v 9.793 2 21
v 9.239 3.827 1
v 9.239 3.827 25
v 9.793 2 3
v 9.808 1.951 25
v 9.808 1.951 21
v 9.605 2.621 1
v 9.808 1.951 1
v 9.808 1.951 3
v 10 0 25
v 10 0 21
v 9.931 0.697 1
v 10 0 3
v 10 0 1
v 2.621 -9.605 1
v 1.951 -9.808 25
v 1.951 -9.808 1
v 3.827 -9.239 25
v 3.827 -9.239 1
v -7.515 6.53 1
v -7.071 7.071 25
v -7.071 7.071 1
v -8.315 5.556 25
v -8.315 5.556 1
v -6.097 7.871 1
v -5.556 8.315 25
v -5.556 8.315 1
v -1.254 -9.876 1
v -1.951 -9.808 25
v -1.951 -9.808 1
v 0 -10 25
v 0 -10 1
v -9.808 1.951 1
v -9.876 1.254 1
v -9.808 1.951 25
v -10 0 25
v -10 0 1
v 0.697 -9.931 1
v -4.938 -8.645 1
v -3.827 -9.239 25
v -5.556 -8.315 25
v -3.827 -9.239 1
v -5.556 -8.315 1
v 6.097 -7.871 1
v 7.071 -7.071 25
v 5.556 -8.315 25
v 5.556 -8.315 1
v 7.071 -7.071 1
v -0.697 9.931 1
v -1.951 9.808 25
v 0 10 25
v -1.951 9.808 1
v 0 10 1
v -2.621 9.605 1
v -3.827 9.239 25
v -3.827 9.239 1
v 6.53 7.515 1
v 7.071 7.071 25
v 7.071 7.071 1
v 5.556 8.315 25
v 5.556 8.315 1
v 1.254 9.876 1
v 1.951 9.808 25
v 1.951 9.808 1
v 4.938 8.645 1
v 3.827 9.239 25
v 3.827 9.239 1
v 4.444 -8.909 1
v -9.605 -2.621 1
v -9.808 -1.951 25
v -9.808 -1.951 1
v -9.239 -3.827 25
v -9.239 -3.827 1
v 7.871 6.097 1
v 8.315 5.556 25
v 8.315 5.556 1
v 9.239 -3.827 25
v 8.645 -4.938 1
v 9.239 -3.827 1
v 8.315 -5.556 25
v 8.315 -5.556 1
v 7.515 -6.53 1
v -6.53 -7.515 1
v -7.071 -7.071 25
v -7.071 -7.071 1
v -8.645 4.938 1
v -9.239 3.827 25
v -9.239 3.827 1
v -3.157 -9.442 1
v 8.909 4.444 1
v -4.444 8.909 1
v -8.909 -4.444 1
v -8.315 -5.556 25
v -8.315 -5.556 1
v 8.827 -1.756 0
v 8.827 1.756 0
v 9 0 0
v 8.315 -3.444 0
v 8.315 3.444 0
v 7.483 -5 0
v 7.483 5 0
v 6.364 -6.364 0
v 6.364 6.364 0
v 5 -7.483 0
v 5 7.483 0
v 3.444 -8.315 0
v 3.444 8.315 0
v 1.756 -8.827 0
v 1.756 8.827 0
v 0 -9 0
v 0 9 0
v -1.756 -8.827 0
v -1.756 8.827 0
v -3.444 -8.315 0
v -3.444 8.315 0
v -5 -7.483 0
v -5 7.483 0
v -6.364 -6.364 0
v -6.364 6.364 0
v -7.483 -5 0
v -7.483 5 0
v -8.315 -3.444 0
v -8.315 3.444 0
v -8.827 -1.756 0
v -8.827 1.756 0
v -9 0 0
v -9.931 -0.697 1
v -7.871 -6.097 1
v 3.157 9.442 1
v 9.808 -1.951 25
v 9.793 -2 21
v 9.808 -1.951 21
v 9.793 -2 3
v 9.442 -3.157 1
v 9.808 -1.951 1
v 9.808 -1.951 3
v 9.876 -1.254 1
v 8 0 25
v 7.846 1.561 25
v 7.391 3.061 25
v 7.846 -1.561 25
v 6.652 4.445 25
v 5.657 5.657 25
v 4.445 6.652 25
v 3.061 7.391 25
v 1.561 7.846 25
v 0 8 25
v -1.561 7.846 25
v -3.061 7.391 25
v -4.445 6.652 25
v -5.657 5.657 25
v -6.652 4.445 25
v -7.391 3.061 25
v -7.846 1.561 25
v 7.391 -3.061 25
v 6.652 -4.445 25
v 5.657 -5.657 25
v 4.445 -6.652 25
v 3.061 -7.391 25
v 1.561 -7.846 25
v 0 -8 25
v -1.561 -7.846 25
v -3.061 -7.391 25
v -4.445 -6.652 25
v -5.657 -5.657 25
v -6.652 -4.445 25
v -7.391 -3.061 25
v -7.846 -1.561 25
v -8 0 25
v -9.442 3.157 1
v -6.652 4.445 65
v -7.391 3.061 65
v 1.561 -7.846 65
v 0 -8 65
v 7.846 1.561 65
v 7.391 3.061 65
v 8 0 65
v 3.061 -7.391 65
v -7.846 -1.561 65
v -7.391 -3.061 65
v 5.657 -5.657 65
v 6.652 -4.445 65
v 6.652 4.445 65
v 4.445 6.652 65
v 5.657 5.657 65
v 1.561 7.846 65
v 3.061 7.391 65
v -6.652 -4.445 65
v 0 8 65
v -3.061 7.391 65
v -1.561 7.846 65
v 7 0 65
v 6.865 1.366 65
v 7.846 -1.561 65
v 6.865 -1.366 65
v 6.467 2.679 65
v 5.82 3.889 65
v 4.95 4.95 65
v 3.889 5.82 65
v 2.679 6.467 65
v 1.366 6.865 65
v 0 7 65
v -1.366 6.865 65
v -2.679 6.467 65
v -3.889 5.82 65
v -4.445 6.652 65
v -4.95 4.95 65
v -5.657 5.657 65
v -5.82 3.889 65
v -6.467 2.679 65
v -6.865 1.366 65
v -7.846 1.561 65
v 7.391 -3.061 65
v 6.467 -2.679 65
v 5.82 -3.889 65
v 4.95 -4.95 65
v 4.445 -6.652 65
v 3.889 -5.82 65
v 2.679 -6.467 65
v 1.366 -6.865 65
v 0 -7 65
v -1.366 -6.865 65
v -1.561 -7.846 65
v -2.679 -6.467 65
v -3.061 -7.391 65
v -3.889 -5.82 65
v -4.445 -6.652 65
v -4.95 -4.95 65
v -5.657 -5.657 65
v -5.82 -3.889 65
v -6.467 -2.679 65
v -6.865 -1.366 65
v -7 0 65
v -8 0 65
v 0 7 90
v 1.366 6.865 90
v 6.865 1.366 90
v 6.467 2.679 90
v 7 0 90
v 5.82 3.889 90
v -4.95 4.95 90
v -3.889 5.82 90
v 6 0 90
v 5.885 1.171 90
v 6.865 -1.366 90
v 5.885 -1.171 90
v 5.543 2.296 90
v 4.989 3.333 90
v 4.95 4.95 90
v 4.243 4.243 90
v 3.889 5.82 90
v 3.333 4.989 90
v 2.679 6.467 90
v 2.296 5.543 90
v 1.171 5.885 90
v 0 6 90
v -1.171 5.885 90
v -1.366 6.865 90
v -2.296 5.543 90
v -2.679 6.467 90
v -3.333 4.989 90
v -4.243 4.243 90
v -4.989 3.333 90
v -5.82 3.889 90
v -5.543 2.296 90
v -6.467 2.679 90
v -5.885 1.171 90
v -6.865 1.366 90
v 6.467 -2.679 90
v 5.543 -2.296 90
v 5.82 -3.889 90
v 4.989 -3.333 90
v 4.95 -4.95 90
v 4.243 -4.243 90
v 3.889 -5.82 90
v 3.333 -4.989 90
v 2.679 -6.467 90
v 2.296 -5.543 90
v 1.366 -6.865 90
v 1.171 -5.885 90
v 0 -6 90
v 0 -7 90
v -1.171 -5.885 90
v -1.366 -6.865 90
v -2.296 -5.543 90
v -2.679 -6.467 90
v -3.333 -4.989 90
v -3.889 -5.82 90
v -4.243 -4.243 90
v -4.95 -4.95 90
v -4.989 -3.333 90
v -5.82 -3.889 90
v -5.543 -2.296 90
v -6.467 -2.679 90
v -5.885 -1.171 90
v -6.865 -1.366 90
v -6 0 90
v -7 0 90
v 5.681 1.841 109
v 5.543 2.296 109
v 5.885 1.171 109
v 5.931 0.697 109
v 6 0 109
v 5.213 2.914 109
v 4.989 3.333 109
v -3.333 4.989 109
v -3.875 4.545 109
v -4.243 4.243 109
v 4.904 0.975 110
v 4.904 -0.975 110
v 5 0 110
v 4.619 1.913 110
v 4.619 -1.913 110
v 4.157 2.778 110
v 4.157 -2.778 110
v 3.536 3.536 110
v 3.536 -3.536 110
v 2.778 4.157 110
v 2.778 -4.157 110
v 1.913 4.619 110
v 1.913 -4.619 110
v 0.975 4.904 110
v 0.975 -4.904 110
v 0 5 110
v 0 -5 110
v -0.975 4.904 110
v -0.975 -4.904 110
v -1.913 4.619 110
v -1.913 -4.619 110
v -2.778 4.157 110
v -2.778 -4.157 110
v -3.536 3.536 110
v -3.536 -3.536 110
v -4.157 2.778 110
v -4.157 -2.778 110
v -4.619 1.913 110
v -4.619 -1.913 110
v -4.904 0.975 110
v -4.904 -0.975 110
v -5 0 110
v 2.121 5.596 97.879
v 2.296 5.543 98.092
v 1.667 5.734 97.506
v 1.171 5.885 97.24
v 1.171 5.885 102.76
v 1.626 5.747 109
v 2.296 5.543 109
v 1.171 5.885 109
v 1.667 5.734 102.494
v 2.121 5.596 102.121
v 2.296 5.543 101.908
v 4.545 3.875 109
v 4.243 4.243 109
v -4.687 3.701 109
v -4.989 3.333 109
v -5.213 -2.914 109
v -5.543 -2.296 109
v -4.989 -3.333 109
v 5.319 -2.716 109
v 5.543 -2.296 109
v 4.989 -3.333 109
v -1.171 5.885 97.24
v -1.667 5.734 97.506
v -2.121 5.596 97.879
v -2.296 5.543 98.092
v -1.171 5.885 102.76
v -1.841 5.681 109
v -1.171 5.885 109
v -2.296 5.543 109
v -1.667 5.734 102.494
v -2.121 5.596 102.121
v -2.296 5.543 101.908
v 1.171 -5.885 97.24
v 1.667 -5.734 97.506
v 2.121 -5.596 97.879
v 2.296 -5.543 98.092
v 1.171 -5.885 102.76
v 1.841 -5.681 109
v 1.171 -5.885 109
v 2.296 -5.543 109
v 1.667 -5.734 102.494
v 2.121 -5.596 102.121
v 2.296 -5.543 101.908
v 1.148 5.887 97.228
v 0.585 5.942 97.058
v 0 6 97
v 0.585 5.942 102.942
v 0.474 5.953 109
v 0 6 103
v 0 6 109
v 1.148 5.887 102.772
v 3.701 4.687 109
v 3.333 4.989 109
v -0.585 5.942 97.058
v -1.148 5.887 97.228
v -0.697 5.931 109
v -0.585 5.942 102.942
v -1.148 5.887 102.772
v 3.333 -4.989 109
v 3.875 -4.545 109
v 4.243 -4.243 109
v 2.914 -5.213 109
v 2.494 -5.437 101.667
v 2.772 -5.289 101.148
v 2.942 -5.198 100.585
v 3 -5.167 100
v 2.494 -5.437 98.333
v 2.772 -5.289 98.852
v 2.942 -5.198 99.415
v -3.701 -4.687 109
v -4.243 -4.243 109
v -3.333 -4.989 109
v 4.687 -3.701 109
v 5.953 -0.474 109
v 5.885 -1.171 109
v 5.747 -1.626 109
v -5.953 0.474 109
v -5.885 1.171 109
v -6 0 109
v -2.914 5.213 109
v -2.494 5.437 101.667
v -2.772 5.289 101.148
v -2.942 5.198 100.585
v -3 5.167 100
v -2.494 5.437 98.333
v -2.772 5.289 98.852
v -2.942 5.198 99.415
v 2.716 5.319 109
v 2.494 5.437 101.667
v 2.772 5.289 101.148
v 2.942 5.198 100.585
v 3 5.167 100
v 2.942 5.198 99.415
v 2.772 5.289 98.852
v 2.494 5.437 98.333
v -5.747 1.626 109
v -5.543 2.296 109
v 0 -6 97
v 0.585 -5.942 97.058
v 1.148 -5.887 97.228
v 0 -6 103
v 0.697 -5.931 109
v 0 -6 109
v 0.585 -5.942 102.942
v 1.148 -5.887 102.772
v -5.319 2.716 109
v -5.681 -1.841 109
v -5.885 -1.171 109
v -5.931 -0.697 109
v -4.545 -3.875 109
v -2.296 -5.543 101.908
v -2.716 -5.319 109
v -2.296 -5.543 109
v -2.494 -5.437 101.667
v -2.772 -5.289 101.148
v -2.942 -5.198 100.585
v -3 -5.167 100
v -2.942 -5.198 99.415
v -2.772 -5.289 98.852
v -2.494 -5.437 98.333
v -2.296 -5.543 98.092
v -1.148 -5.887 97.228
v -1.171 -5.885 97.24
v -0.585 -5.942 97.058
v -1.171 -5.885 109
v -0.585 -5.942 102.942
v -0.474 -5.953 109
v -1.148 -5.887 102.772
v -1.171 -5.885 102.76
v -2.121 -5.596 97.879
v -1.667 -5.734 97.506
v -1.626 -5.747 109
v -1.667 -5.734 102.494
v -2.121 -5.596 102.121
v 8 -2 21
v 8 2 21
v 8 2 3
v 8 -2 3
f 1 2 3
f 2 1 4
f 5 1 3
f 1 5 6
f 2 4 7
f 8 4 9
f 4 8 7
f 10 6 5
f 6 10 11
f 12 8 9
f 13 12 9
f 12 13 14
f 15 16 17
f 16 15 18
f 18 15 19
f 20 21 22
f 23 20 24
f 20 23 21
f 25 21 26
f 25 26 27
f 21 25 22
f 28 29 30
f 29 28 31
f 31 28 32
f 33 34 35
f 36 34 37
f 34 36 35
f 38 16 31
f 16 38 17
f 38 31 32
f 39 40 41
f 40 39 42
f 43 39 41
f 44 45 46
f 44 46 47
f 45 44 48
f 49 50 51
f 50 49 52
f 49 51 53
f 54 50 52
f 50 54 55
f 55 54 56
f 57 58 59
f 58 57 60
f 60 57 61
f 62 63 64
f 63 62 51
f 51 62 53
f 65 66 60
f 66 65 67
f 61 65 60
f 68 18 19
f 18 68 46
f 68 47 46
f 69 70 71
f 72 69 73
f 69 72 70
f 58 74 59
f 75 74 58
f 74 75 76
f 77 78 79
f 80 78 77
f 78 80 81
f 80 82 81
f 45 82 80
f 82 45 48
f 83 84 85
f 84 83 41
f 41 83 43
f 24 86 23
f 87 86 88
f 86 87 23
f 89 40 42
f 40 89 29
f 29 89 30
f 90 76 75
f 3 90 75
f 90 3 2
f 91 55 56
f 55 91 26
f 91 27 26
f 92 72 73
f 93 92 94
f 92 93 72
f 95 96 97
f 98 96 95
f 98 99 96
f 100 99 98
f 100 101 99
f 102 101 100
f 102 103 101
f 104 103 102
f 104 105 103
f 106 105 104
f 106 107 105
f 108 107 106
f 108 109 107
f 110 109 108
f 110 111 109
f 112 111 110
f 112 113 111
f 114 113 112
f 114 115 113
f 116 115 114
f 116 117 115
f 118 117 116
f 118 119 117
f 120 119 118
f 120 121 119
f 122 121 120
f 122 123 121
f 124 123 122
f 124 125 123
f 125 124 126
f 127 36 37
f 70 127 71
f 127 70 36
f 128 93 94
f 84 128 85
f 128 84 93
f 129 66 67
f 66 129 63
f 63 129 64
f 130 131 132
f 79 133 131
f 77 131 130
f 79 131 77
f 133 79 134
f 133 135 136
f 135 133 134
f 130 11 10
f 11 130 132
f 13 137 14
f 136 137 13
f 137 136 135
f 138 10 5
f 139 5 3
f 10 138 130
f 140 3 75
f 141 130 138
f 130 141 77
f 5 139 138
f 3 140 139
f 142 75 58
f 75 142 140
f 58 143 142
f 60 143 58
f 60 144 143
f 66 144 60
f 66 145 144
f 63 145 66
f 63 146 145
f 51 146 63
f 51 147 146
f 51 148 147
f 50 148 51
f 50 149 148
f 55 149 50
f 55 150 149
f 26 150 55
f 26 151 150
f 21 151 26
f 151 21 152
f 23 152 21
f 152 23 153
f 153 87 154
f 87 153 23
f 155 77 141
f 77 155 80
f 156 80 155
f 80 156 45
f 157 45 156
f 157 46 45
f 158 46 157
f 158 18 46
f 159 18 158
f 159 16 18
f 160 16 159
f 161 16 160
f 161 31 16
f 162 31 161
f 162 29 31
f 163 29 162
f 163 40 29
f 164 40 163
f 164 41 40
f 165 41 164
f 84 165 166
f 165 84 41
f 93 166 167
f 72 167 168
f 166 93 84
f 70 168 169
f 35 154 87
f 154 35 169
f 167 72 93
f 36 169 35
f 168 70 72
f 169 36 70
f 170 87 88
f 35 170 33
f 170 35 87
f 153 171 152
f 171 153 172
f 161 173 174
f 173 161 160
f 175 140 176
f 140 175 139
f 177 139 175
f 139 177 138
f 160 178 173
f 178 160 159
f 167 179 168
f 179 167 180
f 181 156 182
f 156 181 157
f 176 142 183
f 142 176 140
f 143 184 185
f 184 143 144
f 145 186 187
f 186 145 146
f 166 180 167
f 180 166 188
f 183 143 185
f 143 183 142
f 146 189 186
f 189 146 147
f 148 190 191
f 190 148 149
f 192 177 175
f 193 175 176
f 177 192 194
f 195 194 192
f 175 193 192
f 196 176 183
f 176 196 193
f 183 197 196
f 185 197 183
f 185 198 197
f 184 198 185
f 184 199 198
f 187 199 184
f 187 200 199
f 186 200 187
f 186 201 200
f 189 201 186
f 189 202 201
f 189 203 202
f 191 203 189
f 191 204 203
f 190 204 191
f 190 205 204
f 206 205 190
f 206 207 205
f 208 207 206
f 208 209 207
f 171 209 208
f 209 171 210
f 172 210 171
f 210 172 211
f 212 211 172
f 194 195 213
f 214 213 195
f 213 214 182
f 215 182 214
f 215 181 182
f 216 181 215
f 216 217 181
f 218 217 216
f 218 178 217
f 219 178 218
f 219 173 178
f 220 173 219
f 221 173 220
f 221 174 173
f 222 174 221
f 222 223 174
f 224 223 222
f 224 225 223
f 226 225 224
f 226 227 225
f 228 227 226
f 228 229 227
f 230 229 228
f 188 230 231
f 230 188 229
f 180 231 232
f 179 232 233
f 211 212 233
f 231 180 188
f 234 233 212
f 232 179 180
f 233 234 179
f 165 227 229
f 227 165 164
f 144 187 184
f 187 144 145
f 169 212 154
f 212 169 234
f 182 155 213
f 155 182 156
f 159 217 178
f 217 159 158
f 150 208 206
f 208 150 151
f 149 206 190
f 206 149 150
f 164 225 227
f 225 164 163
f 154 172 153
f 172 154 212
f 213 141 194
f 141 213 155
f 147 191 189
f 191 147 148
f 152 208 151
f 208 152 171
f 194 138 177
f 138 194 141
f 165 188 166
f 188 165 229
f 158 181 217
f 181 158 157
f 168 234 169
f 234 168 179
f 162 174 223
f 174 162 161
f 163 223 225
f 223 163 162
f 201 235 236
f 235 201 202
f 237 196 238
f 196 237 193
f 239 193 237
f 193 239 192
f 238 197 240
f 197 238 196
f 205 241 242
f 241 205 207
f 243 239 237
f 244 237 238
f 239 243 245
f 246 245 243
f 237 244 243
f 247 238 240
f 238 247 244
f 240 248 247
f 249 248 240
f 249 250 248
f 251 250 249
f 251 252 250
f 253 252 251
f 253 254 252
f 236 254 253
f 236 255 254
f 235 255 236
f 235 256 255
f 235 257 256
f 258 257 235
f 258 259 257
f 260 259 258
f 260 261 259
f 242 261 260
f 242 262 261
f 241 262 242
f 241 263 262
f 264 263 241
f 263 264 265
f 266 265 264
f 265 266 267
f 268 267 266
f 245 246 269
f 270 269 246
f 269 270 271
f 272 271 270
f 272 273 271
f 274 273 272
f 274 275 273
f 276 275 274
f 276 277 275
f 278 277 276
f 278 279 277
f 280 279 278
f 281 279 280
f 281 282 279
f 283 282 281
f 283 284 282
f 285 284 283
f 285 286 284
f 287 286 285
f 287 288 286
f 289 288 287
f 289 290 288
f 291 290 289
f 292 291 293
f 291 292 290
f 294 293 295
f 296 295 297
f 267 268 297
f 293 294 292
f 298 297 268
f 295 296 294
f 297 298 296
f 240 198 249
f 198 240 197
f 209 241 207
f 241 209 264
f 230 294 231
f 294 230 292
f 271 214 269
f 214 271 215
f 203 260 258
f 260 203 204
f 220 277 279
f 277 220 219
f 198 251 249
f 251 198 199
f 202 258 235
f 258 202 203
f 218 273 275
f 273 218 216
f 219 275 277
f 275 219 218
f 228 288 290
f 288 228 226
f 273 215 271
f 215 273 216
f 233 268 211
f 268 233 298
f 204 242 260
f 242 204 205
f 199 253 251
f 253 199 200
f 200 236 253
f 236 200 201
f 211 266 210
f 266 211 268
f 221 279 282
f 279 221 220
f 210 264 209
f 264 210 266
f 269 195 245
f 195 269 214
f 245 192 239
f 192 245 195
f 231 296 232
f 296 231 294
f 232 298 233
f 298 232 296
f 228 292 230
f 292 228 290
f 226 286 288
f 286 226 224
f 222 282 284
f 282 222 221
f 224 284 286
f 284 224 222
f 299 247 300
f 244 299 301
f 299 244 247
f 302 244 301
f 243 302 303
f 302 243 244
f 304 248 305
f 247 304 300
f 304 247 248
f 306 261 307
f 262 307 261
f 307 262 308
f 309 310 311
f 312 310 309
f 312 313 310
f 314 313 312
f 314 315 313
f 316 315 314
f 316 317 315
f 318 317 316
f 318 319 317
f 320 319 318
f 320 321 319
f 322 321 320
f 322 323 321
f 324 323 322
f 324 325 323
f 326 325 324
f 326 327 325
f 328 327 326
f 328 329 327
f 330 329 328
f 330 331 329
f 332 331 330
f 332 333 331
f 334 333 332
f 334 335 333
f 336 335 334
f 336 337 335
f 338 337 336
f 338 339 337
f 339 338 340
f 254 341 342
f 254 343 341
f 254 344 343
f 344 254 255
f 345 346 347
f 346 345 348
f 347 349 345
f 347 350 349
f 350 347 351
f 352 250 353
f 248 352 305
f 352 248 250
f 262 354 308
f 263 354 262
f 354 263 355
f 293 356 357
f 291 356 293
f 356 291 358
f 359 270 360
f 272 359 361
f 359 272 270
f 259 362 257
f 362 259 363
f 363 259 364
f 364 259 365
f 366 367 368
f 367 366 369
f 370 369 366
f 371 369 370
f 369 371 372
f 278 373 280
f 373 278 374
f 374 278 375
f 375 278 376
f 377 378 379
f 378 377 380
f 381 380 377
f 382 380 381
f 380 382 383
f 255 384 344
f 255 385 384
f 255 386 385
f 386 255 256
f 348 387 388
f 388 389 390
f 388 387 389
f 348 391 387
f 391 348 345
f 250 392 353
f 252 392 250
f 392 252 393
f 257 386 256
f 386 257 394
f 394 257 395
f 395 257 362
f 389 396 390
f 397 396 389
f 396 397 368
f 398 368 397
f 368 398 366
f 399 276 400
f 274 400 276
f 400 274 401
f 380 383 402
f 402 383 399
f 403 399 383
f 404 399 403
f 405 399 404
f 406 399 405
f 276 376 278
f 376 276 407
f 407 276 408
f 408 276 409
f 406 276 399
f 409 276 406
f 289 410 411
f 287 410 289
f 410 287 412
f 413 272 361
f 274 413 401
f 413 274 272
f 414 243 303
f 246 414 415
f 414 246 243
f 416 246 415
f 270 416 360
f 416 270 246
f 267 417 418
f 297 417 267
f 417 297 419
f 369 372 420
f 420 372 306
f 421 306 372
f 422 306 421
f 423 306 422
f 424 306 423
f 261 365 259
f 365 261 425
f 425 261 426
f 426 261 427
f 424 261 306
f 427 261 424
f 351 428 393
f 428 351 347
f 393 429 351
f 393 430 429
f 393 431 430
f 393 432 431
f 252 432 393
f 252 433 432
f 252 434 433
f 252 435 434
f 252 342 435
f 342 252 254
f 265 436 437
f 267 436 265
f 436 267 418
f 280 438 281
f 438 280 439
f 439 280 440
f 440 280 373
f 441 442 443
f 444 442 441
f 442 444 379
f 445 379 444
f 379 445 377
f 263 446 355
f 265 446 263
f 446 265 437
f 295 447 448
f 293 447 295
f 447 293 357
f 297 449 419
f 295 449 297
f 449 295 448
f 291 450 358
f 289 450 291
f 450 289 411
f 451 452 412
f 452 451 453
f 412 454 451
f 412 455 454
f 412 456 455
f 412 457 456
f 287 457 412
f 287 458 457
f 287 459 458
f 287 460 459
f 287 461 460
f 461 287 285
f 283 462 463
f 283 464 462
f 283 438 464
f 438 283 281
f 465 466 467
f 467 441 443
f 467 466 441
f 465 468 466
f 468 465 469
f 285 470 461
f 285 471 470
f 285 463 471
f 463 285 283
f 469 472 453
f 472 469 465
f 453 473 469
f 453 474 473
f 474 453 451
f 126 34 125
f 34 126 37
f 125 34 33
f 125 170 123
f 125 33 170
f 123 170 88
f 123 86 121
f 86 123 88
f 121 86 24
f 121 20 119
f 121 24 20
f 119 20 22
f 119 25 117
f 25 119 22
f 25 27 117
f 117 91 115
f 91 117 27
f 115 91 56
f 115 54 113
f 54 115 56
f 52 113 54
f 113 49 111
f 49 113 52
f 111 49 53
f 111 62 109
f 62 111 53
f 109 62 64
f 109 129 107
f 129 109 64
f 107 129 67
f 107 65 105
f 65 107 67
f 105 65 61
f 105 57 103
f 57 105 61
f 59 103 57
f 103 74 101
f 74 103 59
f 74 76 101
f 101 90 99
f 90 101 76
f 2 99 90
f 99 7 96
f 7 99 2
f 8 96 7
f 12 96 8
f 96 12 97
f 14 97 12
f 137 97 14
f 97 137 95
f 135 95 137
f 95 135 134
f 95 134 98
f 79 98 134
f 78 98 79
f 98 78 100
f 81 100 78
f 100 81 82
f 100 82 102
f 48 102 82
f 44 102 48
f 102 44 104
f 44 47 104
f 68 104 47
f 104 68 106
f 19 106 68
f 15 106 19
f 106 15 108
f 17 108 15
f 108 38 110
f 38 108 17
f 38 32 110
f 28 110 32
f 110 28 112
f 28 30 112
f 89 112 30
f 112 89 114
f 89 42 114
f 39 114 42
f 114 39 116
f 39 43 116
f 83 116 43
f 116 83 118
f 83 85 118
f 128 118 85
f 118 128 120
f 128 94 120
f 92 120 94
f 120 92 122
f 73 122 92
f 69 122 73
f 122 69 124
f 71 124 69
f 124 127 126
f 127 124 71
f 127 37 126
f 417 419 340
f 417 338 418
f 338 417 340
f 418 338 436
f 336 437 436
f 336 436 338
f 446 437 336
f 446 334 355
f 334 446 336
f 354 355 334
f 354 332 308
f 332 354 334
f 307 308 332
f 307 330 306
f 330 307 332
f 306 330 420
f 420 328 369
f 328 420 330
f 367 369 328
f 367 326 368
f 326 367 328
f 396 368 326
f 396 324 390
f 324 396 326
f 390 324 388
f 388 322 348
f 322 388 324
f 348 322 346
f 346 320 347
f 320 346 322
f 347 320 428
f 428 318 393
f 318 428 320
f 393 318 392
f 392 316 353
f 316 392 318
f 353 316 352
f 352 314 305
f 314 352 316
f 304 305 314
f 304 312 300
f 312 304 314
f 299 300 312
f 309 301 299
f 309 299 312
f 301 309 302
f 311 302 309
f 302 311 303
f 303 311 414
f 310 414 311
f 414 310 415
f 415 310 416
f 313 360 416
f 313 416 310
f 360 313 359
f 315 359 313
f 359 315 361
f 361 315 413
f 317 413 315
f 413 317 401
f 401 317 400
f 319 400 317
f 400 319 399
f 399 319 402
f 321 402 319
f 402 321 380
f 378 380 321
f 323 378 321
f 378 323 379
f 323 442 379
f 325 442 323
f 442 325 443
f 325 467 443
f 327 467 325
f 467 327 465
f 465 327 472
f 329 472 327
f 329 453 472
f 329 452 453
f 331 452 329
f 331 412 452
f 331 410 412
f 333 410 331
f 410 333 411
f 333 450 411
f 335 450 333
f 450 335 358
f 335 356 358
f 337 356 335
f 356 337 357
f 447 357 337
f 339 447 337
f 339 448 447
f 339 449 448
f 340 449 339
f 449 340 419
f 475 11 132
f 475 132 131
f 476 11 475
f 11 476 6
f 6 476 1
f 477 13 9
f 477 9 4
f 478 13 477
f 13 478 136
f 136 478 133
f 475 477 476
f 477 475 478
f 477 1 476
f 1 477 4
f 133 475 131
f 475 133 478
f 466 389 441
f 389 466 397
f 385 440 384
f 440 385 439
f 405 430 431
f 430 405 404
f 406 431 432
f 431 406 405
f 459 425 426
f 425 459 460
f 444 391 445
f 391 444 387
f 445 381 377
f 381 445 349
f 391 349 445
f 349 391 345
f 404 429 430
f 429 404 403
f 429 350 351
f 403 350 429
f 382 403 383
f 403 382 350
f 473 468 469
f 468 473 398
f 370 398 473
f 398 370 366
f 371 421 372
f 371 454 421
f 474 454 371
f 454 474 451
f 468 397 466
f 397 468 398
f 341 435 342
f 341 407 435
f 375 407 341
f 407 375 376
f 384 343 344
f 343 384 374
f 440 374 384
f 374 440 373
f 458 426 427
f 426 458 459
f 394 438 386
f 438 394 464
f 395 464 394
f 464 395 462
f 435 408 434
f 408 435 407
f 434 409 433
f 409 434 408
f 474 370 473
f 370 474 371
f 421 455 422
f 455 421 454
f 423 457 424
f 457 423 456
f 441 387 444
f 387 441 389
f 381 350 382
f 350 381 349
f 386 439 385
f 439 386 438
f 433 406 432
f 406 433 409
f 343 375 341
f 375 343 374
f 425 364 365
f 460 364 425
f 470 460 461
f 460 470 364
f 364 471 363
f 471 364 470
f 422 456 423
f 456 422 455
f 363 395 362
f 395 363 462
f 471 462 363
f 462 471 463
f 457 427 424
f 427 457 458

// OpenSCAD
$fn = 32;

// ----------------------------------------------------------------------
// Stepped shaft: diameters 20, 16, 14, 12 mm, 110 mm long
// ----------------------------------------------------------------------

// --- parameters (mm) ---
d1 = 20;                  // step 1 diameter
len1 = 25;                // step 1 length
d2 = 16;                  // step 2 diameter
len2 = 40;                // step 2 length
d3 = 14;                  // step 3 diameter
len3 = 25;                // step 3 length
d4 = 12;                  // step 4 diameter
len4 = 20;                // step 4 length
total = 110;              // overall length
chamfer = 1;              // end chamfer
key_w = 4;                // keyway width
key_d = 2;                // keyway depth
key_len = 18;             // keyway length
key_z = 3;                // keyway start along the shaft
cross_d = 6;              // cross pin hole
cross_z = 100;            // cross hole position

difference() {
  /* turned body: stacked cylinders, every step sunk into the bigger one */
  union() {
    cylinder(h = len1, d = d1);
    translate([0, 0, 24.6]) cylinder(h = 40.4, d = d2);
    translate([0, 0, 64.6]) cylinder(h = 25.4, d = d3);
    translate([0, 0, 89.6]) cylinder(h = 20.4, d = d4);
  }
  /* bottom chamfer ring cut */
  rotate_extrude() translate([9, -2.5]) polygon([[0, 0], [3.5, 0], [3.5, 6], [0, 2.5]]);
  /* top chamfer ring cut */
  rotate_extrude() translate([5, 110]) polygon([[0, 0], [3.5, -3.5], [3.5, 2.5], [0, 2.5]]);
  /* keyway milled along the first step */
  translate([d1 / 2 - key_d, -key_w / 2, key_z]) cube([key_d + 2.5, key_w, key_len]);
  /* cross pin hole through the small step */
  translate([0, 0, cross_z]) rotate([90, 0, 0]) cylinder(h = d4 + 5, d = cross_d, center = true);
}
